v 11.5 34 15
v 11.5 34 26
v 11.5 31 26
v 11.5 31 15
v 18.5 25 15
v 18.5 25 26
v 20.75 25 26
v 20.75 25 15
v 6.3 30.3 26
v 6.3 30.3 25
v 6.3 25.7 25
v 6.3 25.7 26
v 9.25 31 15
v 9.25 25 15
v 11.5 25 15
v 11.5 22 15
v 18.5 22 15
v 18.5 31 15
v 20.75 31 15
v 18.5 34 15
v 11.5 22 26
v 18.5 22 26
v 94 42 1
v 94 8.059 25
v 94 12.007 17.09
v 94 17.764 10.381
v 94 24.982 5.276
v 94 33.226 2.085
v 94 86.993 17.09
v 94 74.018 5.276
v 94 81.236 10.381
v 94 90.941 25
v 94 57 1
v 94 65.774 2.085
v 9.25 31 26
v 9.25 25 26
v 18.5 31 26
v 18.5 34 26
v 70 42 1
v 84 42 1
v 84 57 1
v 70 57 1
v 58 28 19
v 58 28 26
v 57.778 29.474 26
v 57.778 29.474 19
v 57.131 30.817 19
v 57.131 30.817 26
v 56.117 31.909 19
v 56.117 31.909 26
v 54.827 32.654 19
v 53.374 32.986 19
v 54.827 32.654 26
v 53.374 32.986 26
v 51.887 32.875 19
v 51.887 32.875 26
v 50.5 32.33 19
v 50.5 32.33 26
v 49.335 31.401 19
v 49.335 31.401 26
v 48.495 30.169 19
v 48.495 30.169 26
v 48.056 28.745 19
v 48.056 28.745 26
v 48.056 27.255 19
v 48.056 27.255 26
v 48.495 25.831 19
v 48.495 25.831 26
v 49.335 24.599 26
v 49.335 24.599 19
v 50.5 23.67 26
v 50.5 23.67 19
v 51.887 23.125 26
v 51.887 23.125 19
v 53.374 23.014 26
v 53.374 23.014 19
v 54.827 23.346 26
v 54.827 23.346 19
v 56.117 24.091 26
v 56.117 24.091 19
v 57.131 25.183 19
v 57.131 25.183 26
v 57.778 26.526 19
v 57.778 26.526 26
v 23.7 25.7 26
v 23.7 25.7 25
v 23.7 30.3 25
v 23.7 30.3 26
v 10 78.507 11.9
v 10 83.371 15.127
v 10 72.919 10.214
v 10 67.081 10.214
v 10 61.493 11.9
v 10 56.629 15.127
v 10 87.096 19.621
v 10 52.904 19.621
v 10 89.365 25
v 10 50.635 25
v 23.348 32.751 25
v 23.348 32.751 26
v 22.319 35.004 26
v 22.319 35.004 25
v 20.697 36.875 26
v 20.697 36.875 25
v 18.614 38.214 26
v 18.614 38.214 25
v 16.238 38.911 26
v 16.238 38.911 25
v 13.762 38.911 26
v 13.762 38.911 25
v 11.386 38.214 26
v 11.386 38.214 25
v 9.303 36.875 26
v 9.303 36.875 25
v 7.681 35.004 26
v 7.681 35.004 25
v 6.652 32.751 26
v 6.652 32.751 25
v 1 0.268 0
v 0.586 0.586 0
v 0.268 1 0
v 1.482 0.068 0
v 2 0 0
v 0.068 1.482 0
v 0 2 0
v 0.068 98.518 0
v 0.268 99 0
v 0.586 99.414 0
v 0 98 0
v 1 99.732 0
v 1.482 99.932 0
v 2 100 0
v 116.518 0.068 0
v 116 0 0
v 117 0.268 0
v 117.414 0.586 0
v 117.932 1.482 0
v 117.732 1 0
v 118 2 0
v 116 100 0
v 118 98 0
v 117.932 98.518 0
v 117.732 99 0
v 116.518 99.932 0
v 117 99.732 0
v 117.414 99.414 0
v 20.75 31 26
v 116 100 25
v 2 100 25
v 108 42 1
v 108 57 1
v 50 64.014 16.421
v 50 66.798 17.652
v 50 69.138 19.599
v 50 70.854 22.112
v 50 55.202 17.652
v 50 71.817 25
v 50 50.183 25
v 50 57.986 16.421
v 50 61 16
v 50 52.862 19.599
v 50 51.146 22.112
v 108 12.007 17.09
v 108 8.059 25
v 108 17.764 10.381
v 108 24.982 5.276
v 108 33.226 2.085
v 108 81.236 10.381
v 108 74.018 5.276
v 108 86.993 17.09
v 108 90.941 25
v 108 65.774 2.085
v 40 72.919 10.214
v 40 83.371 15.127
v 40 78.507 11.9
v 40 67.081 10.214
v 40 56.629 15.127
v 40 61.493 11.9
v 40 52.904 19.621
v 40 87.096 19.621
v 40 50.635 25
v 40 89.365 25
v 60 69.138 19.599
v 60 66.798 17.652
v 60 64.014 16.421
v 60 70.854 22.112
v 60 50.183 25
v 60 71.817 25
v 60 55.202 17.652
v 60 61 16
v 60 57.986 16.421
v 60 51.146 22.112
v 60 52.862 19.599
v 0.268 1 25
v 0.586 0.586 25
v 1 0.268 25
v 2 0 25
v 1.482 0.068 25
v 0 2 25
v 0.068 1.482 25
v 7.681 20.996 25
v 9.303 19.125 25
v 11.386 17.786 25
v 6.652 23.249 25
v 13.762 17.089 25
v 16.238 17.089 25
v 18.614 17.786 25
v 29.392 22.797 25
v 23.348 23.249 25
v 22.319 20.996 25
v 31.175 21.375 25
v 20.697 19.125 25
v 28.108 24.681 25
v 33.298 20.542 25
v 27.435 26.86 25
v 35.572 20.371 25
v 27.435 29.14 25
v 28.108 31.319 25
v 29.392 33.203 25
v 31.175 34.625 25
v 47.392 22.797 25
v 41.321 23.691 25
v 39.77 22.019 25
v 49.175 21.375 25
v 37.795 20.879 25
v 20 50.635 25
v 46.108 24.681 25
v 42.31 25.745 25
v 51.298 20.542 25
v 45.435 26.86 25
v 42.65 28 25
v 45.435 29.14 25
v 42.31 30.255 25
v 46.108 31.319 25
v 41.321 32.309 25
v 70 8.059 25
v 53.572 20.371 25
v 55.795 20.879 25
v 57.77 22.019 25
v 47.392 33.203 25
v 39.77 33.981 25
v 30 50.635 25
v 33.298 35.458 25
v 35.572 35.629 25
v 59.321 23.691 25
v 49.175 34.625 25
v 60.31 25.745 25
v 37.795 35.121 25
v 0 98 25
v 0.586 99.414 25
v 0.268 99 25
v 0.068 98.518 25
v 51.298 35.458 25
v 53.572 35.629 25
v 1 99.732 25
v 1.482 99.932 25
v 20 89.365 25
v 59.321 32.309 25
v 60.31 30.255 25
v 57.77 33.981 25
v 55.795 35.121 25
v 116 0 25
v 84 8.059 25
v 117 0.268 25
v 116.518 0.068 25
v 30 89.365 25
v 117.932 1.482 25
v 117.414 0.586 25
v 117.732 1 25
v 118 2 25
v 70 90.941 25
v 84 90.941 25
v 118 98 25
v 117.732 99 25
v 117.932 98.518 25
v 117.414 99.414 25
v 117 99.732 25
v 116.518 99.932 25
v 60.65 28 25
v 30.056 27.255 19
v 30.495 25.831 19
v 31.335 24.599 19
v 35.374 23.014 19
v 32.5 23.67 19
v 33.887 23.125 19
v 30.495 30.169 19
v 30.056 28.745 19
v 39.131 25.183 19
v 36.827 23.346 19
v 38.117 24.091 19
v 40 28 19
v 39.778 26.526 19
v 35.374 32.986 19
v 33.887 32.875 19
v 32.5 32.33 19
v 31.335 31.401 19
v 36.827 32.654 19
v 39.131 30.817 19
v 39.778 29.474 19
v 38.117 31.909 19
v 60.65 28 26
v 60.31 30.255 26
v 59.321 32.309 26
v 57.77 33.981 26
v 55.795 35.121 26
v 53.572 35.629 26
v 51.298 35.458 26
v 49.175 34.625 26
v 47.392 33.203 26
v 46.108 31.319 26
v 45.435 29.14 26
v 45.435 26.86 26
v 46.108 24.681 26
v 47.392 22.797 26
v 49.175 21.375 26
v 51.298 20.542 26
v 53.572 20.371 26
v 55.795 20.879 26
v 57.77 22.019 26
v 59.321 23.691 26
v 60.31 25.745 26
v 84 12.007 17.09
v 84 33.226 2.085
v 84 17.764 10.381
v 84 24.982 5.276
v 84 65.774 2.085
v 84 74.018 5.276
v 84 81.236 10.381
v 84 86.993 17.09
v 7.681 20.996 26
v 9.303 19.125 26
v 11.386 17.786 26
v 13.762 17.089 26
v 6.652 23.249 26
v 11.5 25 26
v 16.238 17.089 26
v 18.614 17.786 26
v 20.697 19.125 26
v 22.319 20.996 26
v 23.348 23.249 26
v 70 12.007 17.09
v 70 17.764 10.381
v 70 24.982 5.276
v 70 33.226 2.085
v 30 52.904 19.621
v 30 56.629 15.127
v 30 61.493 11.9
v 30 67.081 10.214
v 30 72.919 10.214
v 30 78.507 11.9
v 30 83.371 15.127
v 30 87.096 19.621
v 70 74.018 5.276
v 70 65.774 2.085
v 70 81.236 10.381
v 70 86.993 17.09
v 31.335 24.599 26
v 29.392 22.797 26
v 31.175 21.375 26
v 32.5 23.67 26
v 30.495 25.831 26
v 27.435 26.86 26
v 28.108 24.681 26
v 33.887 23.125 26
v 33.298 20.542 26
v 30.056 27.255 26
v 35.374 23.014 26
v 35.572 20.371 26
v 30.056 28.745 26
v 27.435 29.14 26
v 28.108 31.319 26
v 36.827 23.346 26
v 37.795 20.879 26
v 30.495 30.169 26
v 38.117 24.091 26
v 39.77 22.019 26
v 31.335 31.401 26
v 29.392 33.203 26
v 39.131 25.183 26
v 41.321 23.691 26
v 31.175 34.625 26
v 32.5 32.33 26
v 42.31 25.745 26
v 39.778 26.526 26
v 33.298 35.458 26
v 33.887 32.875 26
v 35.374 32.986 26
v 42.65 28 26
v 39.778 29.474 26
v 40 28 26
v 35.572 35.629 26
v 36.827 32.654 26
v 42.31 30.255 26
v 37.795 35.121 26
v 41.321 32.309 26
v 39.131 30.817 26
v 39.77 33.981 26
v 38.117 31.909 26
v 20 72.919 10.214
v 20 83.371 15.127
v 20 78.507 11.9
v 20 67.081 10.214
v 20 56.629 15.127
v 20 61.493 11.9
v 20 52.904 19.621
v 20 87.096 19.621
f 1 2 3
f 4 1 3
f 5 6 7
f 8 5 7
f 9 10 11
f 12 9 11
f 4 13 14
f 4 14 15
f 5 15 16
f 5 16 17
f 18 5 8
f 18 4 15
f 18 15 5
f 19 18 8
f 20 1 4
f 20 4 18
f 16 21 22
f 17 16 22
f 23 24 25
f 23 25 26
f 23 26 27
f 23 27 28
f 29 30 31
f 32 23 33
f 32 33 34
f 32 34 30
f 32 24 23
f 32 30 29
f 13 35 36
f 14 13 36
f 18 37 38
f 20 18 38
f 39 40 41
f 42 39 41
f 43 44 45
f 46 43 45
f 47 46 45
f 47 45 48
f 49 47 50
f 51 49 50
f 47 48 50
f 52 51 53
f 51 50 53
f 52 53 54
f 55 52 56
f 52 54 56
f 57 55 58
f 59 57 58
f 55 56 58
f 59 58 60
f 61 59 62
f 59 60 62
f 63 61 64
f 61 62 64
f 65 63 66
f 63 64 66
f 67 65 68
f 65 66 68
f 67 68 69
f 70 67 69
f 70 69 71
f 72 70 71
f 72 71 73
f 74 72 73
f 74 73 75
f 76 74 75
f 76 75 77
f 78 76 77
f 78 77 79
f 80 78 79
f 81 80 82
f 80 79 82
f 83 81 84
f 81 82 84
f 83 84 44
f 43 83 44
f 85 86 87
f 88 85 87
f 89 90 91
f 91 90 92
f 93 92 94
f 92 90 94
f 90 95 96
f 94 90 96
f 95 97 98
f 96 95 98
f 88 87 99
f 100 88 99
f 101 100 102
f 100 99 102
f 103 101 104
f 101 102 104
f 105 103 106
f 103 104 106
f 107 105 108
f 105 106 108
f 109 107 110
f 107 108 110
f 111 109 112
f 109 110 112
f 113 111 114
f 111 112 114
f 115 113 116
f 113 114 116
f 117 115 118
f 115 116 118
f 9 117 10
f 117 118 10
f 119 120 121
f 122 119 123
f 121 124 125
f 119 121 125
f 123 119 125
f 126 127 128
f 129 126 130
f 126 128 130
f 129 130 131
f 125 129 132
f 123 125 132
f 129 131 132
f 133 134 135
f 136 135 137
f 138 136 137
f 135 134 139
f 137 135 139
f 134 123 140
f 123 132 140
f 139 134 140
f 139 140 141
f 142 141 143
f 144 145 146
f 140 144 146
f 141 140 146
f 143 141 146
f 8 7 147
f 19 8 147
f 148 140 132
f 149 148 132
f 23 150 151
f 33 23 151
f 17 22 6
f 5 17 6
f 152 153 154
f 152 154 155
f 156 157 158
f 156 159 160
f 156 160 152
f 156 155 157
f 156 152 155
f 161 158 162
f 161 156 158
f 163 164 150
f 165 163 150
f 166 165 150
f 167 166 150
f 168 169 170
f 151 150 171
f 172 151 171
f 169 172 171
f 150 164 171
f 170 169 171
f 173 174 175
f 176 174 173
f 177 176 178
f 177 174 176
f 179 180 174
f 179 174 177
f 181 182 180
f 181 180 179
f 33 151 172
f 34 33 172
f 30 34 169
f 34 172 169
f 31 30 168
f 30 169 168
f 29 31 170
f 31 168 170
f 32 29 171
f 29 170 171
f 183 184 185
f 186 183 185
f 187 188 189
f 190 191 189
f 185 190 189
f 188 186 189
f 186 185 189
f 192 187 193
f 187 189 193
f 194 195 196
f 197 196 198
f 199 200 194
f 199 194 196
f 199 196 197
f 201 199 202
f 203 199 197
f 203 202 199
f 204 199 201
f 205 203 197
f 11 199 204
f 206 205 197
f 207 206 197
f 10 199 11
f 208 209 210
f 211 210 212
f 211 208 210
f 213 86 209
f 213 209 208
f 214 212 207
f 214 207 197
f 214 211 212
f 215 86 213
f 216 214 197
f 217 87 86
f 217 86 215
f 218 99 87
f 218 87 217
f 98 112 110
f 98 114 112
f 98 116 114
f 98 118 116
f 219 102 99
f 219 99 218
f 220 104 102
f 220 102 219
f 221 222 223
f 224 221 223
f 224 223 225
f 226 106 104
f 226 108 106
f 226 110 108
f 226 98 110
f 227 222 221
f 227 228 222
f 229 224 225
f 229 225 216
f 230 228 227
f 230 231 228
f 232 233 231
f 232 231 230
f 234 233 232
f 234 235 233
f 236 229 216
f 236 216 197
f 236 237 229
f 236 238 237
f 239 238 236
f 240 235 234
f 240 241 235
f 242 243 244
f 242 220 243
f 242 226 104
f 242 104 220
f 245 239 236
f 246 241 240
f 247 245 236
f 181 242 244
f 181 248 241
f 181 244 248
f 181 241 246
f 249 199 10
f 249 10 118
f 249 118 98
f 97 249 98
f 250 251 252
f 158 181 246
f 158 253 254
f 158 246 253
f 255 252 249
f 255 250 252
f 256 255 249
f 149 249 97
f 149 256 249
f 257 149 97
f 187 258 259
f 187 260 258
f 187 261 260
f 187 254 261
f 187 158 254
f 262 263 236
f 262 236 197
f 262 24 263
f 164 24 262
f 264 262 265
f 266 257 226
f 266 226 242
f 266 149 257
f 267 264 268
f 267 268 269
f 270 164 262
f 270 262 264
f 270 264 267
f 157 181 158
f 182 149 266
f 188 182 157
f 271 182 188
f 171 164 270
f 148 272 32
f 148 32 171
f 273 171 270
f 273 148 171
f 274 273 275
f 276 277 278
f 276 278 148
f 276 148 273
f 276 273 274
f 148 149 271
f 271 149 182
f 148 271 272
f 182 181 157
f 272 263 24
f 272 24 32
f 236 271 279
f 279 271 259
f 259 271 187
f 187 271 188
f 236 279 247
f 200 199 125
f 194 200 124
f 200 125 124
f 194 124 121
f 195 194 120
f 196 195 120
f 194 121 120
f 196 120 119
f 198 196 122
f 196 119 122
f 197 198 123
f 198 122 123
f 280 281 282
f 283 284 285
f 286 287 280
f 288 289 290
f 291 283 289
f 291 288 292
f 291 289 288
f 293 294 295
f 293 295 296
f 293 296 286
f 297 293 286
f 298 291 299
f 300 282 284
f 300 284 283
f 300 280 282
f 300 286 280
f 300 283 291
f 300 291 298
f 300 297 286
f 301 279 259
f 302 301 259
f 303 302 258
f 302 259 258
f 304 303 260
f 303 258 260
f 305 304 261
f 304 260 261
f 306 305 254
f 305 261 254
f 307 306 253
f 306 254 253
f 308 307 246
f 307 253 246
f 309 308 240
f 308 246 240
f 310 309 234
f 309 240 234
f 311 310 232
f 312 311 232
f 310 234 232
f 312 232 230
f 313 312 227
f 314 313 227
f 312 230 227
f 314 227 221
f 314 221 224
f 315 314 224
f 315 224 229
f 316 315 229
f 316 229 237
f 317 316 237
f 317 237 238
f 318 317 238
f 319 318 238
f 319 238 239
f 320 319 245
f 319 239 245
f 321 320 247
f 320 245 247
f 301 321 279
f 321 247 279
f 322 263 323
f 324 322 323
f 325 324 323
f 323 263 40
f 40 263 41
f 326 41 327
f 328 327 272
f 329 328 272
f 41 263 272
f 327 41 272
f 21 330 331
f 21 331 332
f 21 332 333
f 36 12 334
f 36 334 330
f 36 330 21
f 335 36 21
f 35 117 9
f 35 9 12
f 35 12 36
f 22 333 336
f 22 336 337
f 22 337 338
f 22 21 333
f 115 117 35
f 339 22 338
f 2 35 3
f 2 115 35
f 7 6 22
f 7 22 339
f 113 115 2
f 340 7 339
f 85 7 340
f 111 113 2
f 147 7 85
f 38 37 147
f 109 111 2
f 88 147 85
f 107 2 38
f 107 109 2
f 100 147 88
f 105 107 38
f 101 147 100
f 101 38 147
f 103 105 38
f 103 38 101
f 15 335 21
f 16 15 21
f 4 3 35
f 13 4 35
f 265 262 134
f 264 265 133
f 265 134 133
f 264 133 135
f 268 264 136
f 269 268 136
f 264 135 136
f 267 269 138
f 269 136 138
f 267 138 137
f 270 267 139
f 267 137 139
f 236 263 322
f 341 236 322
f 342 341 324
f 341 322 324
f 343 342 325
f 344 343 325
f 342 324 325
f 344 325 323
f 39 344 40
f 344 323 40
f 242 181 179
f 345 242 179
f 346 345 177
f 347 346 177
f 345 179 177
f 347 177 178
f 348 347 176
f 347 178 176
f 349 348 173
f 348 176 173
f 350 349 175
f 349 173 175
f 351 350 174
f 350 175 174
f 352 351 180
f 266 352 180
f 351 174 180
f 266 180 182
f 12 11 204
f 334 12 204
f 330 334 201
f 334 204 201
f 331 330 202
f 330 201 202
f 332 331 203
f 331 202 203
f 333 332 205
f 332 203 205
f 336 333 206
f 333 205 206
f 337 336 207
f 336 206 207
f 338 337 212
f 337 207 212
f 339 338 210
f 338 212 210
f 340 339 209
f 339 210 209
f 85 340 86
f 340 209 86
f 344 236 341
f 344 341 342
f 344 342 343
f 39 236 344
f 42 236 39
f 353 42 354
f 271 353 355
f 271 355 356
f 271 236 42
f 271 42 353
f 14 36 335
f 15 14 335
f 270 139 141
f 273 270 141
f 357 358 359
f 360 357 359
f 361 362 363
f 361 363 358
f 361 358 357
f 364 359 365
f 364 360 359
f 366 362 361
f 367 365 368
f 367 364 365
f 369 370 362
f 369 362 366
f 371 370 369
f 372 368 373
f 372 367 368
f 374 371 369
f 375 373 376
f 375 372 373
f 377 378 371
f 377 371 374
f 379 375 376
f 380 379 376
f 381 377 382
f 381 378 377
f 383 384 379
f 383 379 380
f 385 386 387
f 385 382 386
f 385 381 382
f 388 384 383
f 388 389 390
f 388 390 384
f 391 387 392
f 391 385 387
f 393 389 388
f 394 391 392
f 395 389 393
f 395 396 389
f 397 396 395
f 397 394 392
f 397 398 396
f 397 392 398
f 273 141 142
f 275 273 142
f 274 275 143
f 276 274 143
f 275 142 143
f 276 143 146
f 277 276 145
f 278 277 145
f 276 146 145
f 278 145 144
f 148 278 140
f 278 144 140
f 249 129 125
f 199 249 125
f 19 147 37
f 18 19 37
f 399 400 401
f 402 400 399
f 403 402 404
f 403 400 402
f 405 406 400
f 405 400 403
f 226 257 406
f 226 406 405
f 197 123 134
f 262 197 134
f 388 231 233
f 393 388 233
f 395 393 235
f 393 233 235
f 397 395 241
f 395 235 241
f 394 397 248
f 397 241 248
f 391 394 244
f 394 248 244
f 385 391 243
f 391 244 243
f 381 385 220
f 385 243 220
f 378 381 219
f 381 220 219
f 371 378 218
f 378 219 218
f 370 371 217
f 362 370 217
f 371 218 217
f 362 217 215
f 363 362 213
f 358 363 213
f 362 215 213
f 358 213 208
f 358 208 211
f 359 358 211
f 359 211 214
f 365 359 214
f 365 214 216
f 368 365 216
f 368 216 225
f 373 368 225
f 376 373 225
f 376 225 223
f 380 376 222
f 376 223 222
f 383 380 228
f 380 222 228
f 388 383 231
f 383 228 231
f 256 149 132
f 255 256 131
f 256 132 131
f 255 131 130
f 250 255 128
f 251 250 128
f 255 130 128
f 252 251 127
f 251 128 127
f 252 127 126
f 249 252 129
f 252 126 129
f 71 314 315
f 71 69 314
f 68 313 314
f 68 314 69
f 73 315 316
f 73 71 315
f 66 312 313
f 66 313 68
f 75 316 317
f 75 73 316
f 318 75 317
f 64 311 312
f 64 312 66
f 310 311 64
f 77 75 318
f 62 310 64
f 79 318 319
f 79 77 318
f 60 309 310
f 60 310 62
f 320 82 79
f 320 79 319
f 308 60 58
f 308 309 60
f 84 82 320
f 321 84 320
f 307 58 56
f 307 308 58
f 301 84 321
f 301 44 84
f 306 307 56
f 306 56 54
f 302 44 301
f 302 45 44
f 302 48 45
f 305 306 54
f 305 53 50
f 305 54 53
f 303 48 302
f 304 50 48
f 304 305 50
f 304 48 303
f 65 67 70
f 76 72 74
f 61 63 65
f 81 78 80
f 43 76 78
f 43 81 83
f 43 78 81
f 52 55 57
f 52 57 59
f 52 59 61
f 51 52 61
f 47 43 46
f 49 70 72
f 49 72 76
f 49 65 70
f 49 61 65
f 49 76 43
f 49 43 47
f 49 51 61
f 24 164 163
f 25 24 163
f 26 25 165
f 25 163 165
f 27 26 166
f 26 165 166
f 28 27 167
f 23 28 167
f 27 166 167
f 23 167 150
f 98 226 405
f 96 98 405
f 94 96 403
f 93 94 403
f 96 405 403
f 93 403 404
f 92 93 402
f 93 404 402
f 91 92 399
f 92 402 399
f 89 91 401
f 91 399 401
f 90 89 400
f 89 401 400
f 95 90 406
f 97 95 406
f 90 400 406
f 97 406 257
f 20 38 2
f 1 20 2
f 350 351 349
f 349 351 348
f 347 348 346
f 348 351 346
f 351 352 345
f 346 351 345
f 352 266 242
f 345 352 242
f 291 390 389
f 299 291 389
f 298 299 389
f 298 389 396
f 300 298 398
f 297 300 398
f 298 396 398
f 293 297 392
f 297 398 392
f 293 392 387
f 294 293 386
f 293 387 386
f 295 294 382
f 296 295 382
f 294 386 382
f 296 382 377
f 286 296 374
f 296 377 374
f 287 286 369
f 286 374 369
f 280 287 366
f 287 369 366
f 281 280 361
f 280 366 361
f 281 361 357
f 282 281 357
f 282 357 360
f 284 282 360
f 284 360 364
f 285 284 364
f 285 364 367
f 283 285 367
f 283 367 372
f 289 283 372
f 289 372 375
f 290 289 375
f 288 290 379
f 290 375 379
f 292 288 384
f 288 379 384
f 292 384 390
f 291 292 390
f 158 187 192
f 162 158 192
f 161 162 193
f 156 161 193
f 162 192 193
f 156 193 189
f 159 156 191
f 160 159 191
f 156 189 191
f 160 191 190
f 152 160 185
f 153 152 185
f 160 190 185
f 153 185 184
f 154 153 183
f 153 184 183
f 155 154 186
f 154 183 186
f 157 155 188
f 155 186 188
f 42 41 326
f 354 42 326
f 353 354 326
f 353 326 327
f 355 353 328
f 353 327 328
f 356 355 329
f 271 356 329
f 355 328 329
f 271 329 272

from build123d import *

# Parameters (mm, degrees)
F1_DEPTH  = 25
F2_R      = 7.65
F3_DEPTH  = 1
F5_DEPTH  = 11
F7_W      = 10
F7_H      = 20
F10_W     = 10
F10_H     = 11
F13_START = -10
F13_DEPTH = 14
F14_START = -34
F14_DEPTH = 14
F15_R     = 5
F16_DEPTH = 7


with BuildPart() as f1:
    # F0 (on Top) → F1 (new body)
    with BuildSketch(Plane.XY):
        with BuildLine():
            ThreePointArc((0, 2), (0.5857864376, 0.5857864376), (2, 0))
            Line((2, 0), (116, 0))
            ThreePointArc((116, 0), (117.4142135624, 0.5857864376), (118, 2))
            Line((118, 2), (118, 98))
            ThreePointArc((118, 98), (117.4142135624, 99.4142135624), (116, 100))
            Line((116, 100), (2, 100))
            ThreePointArc((2, 100), (0.5857864376, 99.4142135624), (0, 98))
            Line((0, 98), (0, 2))
        make_face()
    extrude(amount=F1_DEPTH)

    # F2 (on face) → F3 (join)
    with BuildSketch(Plane.XY.offset(25)):
        with Locations((35, 28)):
            Circle(F2_R)
        with BuildLine():
            Line((23.7, 25.7), (23.7, 30.3))
            ThreePointArc((23.7, 30.3), (15, 39), (6.3, 30.3))
            Line((6.3, 30.3), (6.3, 25.7))
            ThreePointArc((6.3, 25.7), (15, 17), (23.7, 25.7))
        make_face()
        with Locations((53, 28)):
            Circle(F2_R)
    extrude(amount=F3_DEPTH)

    # F4 (on face) → F5 (cut)
    with BuildSketch(Plane.XY.offset(26)):
        Polygon((20.75, 25), (20.75, 31), (18.5, 31), (18.5, 34), (11.5, 34), (11.5, 31), (9.25, 31), (9.25, 25), (11.5, 25), (11.5, 22), (18.5, 22), (18.5, 25), align=None)
    extrude(amount=-F5_DEPTH, mode=Mode.SUBTRACT)

    # F7 (on offset) → F8 (revolve, cut)
    with BuildSketch(Plane.XY.offset(30)):
        with Locations((15, 80)):
            Rectangle(F7_W, F7_H)
        with Locations((35, 80)):
            Rectangle(F7_W, F7_H)
    revolve(axis=Axis((25, 70, 30), (1, 0, 0)), mode=Mode.SUBTRACT)

    # F10 (on offset) → F11 (revolve, cut)
    with BuildSketch(Plane.XY.offset(27)):
        with Locations((55, 55.5)):
            Rectangle(F10_W, F10_H)
    revolve(axis=Axis((55, 61, 27), (1, 0, 0)), mode=Mode.SUBTRACT)

    # F12 (on face) → F13 (cut)
    with BuildSketch(Plane.YZ.offset(118).offset(F13_START)):
        with BuildLine():
            Line((42, 1), (57, 1))
            ThreePointArc((57, 1), (92.8019763155, 40.7707415594), (49.5, 72.2100837829))
            ThreePointArc((49.5, 72.2100837829), (6.1980236845, 40.7707415594), (42, 1))
        make_face()
    extrude(amount=-F13_DEPTH, mode=Mode.SUBTRACT)

    # F12 (on face) → F14 (cut)
    with BuildSketch(Plane.YZ.offset(118).offset(F14_START)):
        with BuildLine():
            Line((42, 1), (57, 1))
            ThreePointArc((57, 1), (77.7846096908, 7.6061230866), (90.941125497, 25))
            Line((90.941125497, 25), (8.058874503, 25))
            ThreePointArc((8.058874503, 25), (21.2153903092, 7.6061230866), (42, 1))
        make_face()
    extrude(amount=-F14_DEPTH, mode=Mode.SUBTRACT)

    # F15 (on face) → F16 (cut)
    with BuildSketch(Plane.XY.offset(26)):
        with Locations((35, 28)):
            Circle(F15_R)
        with Locations((53, 28)):
            Circle(F15_R)
    extrude(amount=-F16_DEPTH, mode=Mode.SUBTRACT)


solid = f1.part
